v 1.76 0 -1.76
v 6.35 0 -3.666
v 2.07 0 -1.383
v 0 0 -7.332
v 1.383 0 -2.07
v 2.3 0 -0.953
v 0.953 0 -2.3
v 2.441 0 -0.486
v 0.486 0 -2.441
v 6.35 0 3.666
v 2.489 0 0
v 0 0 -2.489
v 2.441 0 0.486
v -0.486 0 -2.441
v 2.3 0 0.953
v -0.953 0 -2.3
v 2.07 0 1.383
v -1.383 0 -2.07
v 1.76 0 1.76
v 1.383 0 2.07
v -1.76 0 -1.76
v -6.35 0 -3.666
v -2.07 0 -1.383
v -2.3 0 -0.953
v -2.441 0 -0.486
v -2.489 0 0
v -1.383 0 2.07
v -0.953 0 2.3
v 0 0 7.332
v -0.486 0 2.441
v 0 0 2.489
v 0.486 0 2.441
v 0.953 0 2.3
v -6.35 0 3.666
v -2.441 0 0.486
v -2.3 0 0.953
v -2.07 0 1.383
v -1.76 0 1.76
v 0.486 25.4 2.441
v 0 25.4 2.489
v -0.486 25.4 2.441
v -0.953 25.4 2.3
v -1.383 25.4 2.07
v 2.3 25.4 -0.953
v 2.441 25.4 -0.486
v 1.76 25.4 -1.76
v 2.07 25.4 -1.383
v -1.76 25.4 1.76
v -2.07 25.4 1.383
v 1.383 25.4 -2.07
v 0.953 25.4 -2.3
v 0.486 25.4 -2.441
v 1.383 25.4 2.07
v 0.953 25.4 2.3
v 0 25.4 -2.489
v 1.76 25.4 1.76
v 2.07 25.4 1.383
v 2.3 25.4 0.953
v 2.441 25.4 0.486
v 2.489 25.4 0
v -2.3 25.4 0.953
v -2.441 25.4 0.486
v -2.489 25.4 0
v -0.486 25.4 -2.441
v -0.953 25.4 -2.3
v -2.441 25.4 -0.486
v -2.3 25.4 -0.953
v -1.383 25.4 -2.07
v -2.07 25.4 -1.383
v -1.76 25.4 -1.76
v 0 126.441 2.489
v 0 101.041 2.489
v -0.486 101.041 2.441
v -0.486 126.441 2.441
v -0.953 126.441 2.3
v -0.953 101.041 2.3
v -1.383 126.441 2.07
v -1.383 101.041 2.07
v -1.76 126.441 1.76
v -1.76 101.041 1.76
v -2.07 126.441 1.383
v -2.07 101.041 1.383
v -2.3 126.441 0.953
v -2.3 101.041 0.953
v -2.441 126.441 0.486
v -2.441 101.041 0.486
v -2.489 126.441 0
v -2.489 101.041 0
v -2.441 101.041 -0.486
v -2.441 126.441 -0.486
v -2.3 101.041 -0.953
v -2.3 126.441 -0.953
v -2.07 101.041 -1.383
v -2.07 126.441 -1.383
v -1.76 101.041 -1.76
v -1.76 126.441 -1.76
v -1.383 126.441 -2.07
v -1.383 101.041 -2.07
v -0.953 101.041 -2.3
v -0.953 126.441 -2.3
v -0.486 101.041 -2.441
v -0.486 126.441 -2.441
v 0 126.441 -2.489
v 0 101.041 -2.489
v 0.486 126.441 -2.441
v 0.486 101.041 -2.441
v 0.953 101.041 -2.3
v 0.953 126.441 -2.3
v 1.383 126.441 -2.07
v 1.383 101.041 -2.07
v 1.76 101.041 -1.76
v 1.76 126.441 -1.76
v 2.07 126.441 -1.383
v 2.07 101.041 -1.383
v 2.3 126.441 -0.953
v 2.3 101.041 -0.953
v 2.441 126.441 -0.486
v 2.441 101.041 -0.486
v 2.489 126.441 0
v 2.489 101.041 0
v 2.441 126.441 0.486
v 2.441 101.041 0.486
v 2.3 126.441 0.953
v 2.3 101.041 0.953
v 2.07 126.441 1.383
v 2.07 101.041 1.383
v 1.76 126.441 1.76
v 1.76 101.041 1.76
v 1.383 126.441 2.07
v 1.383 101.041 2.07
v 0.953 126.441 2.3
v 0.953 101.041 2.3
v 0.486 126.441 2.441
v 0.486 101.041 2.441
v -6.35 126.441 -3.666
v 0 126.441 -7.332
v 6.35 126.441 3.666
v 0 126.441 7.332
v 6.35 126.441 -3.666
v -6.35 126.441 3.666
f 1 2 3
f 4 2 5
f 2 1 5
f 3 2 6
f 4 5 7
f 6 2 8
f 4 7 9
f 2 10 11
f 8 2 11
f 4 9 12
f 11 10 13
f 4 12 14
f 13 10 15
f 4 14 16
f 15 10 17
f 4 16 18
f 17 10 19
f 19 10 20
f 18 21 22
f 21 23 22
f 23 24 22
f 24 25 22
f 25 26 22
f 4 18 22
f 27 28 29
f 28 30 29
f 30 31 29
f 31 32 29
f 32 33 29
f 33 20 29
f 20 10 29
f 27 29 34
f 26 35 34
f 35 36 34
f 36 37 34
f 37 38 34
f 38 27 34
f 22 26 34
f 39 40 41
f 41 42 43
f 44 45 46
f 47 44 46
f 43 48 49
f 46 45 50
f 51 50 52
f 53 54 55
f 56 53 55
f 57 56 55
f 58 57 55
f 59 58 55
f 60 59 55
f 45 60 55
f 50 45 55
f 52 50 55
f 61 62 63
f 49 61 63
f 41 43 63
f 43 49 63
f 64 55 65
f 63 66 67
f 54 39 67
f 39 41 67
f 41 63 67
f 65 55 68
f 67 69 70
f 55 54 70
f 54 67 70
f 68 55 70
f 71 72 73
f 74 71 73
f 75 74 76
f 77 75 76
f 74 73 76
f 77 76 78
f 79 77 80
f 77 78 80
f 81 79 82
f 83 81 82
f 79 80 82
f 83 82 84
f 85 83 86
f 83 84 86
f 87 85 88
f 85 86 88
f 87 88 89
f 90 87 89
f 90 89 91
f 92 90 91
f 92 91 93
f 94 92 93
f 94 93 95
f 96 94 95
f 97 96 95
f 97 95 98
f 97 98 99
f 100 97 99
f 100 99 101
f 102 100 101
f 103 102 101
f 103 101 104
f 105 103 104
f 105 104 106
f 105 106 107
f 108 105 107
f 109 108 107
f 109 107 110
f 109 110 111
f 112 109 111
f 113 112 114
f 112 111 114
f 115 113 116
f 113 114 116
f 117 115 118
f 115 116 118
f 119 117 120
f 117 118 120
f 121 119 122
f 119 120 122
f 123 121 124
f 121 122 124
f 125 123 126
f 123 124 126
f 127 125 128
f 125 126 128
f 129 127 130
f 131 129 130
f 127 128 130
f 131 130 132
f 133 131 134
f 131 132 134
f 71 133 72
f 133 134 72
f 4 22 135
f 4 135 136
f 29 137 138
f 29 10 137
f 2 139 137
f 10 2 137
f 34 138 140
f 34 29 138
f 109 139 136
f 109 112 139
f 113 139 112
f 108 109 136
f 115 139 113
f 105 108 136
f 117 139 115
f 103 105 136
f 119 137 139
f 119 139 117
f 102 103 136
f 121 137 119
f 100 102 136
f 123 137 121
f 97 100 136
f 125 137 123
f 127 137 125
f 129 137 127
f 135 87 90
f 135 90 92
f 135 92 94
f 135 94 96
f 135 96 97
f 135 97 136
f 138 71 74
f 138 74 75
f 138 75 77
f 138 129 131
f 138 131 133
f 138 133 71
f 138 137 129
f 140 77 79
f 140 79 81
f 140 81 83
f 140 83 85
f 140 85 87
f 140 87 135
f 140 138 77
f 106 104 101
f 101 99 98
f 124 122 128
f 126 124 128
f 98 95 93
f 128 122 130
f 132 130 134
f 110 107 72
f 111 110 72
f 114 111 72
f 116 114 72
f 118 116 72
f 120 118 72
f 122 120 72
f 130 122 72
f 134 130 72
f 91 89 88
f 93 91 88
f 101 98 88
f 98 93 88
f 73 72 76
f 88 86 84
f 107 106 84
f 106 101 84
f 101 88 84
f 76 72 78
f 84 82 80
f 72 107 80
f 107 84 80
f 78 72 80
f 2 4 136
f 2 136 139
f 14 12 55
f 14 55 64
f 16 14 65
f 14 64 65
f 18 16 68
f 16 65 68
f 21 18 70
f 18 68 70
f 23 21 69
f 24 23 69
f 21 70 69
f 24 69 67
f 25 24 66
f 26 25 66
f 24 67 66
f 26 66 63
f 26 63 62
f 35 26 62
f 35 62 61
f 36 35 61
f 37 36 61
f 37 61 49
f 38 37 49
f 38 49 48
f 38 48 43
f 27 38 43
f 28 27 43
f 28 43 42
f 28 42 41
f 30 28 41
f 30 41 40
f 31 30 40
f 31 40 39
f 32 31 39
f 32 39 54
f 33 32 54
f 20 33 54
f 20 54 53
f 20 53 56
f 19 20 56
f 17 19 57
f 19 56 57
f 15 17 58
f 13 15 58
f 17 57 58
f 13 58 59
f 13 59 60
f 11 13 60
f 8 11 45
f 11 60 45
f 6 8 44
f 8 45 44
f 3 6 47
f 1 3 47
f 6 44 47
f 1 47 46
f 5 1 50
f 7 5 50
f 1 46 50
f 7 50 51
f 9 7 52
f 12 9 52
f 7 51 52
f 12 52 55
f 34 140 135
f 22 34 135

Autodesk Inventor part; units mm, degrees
ref_plane "YZ Plane" through (0, 0, 0) normal (1, 0, 0) x (0, 1, 0)
ref_plane "XZ Plane" through (0, 0, 0) normal (0, 1, 0) x (-1, 0, 0)
ref_plane "XY Plane" through (0, 0, 0) normal (0, 0, 1) x (1, 0, 0)
sketch "Sketch1" plane through (0, 0, 0) normal (0, 1, 0) x (-1, 0, 0)
  line L0 (6.35, -3.6662) -> (0, -7.3323)
  line L1 (0, -7.3323) -> (-6.35, -3.6662)
  line L2 (-6.35, -3.6662) -> (-6.35, 3.6662)
  line L3 (-6.35, 3.6662) -> (0, 7.3323)
  line L4 (0, 7.3323) -> (6.35, 3.6662)
  line L5 (6.35, 3.6662) -> (6.35, -3.6662)
  point P0 (0, 0)
  point P1 (0, 0)
  point P2 (0, 0)
  dimension "d0" = 12.7
extrude "Extrusion1" add sketch "Sketch1" along normal blind 126.4412
sketch "Sketch2" plane through (0, 126.4412, 0) normal (0, 1, 0) x (1, 0, 0)
  point P0 (0, 0)
  point P1 (0, 0)
hole "Hole1" at (0, 126.4412, 0) direction (0, -1, 0) diameter 4.9784 depth 25.4 thread size "1/4-20 UNC" class "2B" standard "ANSI Unified Screw Threads"
sketch "Sketch3" plane through (0, 0, 0) normal (0, -1, 0) x (1, 0, 0)
  point P0 (0, 0)
  point P1 (0, 0)
hole "Hole2" at (0, 0, 0) direction (0, 1, 0) diameter 4.9784 depth 25.4 thread size "1/4-20 UNC" class "2B" standard "ANSI Unified Screw Threads"
properties part number "ELEV_039_HEXSHAFT3" material "Aluminum 6061"
